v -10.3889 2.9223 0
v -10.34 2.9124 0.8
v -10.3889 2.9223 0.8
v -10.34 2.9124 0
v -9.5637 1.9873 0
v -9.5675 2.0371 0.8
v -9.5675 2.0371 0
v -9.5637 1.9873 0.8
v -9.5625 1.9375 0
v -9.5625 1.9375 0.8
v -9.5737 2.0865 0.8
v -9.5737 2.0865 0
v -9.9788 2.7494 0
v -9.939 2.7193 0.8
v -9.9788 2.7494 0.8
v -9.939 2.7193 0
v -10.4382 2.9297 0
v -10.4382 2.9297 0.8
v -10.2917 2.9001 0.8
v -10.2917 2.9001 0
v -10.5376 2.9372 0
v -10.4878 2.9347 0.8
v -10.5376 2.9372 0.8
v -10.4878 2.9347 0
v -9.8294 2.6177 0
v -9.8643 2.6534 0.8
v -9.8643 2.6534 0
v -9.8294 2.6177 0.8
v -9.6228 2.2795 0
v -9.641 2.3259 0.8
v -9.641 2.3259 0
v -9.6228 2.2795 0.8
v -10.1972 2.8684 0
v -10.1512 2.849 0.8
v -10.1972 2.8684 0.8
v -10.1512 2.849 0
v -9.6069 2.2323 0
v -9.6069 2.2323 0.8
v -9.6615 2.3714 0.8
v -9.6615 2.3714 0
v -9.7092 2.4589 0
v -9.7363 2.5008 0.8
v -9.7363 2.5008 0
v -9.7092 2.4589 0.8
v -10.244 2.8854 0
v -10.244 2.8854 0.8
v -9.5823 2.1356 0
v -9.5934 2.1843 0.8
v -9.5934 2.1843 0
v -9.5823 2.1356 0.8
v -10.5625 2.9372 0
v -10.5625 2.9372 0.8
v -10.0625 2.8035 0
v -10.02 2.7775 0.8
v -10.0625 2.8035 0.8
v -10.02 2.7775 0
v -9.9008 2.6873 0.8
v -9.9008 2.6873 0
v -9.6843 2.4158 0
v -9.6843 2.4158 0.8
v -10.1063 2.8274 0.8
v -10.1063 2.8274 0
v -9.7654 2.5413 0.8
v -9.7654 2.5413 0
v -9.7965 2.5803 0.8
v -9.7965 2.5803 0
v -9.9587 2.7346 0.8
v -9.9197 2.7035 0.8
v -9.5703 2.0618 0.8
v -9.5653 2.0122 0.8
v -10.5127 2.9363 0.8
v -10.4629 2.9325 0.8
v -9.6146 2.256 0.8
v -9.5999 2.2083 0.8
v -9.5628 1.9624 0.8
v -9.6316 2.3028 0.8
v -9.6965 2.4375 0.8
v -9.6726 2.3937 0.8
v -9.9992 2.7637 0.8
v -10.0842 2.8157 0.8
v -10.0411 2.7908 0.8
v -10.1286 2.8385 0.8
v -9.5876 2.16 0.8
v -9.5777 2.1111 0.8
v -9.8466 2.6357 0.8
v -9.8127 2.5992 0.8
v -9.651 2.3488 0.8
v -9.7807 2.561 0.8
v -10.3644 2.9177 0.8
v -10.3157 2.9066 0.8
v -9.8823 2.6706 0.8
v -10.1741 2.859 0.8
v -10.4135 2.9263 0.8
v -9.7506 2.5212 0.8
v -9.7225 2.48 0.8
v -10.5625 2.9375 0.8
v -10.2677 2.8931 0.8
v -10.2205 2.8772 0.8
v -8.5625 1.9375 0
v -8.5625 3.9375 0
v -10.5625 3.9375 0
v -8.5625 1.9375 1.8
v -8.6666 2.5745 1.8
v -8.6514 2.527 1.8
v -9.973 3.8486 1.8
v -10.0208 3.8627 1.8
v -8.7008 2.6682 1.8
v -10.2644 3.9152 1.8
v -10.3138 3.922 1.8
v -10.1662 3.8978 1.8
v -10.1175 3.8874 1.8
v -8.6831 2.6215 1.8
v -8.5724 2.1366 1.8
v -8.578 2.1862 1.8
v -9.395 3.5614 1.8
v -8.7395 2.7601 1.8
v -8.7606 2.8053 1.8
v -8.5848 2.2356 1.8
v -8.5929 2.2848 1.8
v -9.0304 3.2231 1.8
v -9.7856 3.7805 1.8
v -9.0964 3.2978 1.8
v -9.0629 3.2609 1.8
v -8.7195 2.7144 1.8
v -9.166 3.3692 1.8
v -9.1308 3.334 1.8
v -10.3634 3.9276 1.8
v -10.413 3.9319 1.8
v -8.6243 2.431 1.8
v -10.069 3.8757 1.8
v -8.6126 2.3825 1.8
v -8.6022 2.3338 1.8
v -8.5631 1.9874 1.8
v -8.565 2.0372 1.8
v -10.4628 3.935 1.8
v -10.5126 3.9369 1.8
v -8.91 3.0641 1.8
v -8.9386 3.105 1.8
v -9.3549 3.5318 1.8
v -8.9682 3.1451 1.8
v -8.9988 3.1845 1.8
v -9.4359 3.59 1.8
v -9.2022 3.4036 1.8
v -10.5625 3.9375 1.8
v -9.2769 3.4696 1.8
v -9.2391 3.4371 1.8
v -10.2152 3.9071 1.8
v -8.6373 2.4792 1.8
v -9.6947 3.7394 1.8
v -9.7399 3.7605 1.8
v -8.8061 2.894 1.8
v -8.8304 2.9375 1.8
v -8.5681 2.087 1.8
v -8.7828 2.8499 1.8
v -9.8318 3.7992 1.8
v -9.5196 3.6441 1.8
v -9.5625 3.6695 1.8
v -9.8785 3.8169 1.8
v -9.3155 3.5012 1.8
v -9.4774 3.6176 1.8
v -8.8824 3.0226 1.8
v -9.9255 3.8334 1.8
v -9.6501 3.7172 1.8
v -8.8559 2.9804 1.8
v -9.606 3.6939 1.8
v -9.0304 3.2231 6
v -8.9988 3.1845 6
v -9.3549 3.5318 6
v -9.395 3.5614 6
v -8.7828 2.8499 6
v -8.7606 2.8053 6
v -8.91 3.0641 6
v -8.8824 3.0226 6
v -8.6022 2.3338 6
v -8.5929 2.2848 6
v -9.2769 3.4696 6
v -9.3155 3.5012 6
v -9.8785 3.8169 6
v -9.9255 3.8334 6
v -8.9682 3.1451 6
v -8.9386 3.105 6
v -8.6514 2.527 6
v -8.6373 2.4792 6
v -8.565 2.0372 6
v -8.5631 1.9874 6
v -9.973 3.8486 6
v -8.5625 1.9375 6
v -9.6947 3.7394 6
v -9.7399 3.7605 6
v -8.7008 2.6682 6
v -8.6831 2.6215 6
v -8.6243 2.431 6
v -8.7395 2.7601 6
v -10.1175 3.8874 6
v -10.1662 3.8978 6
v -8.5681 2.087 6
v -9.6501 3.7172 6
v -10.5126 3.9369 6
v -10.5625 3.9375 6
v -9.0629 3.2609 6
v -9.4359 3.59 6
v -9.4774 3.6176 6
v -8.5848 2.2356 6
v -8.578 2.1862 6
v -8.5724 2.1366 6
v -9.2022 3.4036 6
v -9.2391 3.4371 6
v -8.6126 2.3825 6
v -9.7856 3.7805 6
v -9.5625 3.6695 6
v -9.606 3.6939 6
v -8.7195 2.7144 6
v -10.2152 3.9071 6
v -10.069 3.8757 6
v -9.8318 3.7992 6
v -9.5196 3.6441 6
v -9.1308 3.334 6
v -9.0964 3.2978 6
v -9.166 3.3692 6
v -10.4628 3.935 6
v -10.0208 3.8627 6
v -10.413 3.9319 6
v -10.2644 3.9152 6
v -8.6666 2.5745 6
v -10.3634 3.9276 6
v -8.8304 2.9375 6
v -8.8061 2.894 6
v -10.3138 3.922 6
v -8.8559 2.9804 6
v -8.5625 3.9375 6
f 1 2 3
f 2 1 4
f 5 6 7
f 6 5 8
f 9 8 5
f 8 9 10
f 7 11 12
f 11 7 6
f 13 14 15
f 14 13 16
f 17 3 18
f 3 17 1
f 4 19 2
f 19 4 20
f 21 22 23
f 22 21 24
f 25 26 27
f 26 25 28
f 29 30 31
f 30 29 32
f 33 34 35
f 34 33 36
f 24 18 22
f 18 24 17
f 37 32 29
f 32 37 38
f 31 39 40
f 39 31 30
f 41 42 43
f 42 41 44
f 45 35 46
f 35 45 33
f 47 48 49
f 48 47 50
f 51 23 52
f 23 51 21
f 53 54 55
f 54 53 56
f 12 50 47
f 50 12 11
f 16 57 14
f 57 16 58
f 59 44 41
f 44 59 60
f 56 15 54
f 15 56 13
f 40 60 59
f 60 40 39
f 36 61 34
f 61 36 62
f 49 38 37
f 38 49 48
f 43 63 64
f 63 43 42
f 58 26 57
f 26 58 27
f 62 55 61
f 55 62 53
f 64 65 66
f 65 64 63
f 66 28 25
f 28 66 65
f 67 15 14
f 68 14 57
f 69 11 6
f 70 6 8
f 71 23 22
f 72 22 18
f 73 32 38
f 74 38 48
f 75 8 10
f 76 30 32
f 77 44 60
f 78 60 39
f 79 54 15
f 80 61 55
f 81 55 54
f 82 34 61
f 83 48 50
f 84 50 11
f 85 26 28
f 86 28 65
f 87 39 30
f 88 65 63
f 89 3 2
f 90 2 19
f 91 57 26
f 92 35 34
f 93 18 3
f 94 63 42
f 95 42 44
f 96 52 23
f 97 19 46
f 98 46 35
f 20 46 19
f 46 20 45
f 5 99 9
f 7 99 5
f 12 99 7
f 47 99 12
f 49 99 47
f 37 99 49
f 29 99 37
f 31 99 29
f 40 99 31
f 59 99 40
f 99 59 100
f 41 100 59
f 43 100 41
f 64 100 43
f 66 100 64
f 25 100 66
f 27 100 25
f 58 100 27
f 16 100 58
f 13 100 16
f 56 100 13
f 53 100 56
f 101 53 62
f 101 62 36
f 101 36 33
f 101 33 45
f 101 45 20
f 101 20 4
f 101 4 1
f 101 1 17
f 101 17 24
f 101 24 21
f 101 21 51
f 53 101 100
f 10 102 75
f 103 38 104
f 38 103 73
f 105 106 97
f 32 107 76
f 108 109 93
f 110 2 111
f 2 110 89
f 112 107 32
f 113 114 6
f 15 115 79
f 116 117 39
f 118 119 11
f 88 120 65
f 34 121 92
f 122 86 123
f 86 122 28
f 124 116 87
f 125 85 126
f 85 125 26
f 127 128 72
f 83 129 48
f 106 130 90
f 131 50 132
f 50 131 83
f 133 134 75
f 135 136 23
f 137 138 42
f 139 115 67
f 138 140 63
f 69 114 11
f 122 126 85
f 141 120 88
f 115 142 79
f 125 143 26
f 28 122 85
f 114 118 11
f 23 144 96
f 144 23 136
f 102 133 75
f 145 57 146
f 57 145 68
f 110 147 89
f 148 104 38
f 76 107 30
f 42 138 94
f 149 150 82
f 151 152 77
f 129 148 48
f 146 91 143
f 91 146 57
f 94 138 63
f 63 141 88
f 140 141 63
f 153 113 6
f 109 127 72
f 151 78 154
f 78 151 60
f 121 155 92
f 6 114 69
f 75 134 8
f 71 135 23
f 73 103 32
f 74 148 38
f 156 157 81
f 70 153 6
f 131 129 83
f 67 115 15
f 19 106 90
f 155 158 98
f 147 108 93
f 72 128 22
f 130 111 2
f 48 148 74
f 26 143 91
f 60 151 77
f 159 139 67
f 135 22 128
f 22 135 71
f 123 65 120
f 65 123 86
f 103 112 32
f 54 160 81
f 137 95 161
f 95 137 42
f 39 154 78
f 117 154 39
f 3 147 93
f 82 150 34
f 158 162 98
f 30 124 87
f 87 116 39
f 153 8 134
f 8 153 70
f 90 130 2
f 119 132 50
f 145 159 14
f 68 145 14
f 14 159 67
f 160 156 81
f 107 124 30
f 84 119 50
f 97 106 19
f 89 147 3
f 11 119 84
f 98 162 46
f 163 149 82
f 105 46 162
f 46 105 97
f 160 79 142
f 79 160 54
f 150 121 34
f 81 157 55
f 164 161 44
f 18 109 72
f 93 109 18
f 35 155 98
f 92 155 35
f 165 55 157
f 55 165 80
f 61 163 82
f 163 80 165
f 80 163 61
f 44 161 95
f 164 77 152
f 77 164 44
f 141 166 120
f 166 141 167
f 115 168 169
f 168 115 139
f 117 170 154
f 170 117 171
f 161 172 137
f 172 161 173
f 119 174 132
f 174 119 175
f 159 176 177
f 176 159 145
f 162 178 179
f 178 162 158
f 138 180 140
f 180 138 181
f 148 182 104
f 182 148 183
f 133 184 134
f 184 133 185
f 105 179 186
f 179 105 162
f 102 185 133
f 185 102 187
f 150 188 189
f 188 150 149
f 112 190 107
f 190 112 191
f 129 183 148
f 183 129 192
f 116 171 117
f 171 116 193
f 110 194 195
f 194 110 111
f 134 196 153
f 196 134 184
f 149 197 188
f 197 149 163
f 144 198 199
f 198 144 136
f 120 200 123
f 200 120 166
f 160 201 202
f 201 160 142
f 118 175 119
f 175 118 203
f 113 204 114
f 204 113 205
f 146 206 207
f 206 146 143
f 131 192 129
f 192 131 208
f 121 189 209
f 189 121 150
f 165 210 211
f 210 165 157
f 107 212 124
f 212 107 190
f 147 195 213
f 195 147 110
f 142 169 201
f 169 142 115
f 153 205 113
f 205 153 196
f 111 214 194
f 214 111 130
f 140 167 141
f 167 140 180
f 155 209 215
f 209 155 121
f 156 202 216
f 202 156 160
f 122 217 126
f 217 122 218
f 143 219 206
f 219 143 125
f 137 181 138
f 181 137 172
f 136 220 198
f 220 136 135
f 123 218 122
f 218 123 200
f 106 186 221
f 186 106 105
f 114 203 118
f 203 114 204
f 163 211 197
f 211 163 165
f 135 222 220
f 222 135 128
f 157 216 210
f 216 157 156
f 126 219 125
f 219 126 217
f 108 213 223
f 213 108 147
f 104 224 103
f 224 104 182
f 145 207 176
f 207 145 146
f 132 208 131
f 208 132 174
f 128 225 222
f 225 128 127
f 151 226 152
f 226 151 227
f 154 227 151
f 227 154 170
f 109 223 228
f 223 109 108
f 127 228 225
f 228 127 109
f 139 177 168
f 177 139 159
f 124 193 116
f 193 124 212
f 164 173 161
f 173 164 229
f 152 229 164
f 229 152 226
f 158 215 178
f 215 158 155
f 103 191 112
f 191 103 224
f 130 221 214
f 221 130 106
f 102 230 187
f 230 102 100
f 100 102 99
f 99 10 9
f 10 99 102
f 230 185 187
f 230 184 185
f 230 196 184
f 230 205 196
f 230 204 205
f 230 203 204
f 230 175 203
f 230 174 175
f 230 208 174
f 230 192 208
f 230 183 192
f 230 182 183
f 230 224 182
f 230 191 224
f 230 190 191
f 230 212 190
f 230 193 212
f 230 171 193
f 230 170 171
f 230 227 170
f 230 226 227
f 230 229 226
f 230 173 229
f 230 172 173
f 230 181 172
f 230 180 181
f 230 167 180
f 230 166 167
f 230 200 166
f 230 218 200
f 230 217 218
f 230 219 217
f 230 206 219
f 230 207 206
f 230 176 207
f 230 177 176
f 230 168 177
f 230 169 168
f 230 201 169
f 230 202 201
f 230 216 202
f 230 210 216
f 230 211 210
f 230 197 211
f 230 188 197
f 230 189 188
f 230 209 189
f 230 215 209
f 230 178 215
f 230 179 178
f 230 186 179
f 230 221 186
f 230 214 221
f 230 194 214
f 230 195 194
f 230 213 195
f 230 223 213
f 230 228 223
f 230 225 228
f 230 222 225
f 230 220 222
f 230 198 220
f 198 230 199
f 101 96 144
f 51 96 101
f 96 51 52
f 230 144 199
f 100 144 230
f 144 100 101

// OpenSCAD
// file: ../scad/shape_modifier_utils.scad
// Overlap used to break coincident faces in booleans. Subtracting a cut that lands
// exactly on a surface leaves zero-thickness geometry, which renders unpredictably and
// slices worse; every cut is extended by this much so the faces genuinely cross.
//
// A function rather than a variable: `use <...>` exports functions but not top-level
// variable assignments, and the sweep reaches these files through `use`. Twelve modules
// across four files each declared their own `eps = 0.01` before this existed.
function geometry_eps() = 0.01;

// Length for a *centered* cutting solid that must pass entirely through material of
// depth `extent`. A centered cut reaches half this each way, so the factor leaves 50%
// clearance beyond `extent` on both sides -- a cut that lands flush on a face produces
// a zero-thickness shell rather than a clean hole.
//
// Measured against the swept parameter space: the deepest thing any of these cuts must
// clear is one bulkhead_section, one bulkhead_thickness tall, so the margin is 0.5 *
// bulkhead_thickness everywhere and scales with the part. Interconnect bulkheads stack
// two sections, but each section's cuts are applied before stacking, so the stack is
// not what a cut has to span.
function through_cut(extent) = 3 * extent;

// Distance at which to place a mask vertex so it lies outside anything within `extent`
// of the origin. Used by the half-plane polygons that trim an octant down to its
// wedge, where the vertex position only has to be "far enough" to be off the part.
//
// Worst case across 412 valid combinations is 3.25 mm of clearance, at U=0.5 with 1 mm
// panel: the shape reaches panel_offset + panel_overlap = 6.75 mm while the mask sits
// at 10 mm. Positive everywhere, and the gap widens with U.
function mask_reach(extent) = 2 * extent;


module octant_to_full() {
    mirror_x() {
        mirror_y() {
            mirror_xy() {
                children();
            }
        }
    }
}

module mirror_x() {
    union() {
        children();
        mirror([-1,0,0]) {
            children();
        }
    }
    
}

module mirror_y() {
    union() {
        children();
        mirror([0,-1,0]) {
            children();
        }
    }
    
}

module mirror_xy() {
    union() {
        children();
        mirror([1,-1,0]) {
            children();
        }
    }
}

module corner_translate(unit_width, corner_radius) {
    translate([unit_width/2-corner_radius,unit_width/2-corner_radius,0]) {
        children();
    }
}

// Move an octant out to its corner, then mirror it into all four -- the standard way
// a bulkhead profile is built from the one octant that is actually drawn.
//
// Every `*_shape` wrapper in fuselage_bulkhead_geometry.scad had this same pair open-
// coded around its own `*_octant` call. The wrappers stay: they name the full shape as
// distinct from the octant, and they are what seven call sites across two files use.
// It is the repeated body that is worth removing, not the interface.
module octant_tiled(unit_width, corner_radius) {
    octant_to_full() {
        corner_translate(unit_width, corner_radius) {
            children();
        }
    }
}


// mask lower diagonal quadrant
module octant_mask(unit_width, corner_radius) {
    eps = geometry_eps();
    polygon([[corner_radius+eps,corner_radius],
            [corner_radius+eps,-unit_width/2-corner_radius],
            [-unit_width/2-corner_radius+eps,-unit_width/2-corner_radius]]);
}

// fillet inward
module fillet_inner(radius) {
    intersection() {
        offset(r = -radius) {
            // fillet outward as well to ensure we round off any inward fillet artifacts (from input boundaries that are closer than 2*radius)
            offset(r = 2*radius) {
                offset(r = -radius) {
                    children();
                }
            }
        }
        // guarantee that the resultant shape has not gone outside the boundaries of the input shape
        children();
    }
}

// fillet outward
module fillet_outer(radius) {
    union() {
        offset(r = -radius) {
            offset(r = radius) {
                children();
            }
        }
        // guarantee that the resultant shape has not erroded into the boundaries of teh input shape
        children();
    }
}
// main file
// Five of bulkhead_flange_positive's constituent modules, isolated one at a time so the
// port can be checked against each rather than against their union.
//
// Derived parameters for U=1.0 end_bolt 3/16in.
//
//   which = 0  outer_corner_fillet
//   which = 1  bulkhead_flange_chamfer
//   which = 2  greeble_to_web_fillet
//   which = 3  bulkhead_bolt_flange_fillet
//   which = 4  web_to_bolt_fillet
//
// All five are the same shape of thing: a small block of material at a corner, minus a
// stepped stack of a cylinder, a cone and a cylinder. The step is the chamfer, and the
// result is a true fillet -- these are not the morphological fillet_inner.
//
// 3 and 4 differ from 0-2 in outline only: instead of an axis-aligned block they extrude a
// polygon whose last vertex is the fillet center pushed one radius along the ray from the
// bolt center, so bolt center / fillet center / end point are collinear by construction and
// the closing edge doubles back with zero area. Their outlines are quadrilaterals.
$fa=1;
$fs=0.05;

use <../scad/fuselage_bulkhead_geometry.scad>

make_web = true;
is_interconnect = false;
unit_width = 100.0;
bulkhead_thickness = 6;
corner_radius = 10.0;
panel_thickness = 4.7625;
panel_offset = 2.5;
panel_overlap = 4.7625;
panel_tolerance = 0.1;
bolt_hole_radius = 2.0;
bolt_thickness = 3.0;
bolt_offset = 8.0;
plate_thickness = 0.8;
flange_fillet_radius = 2.0;
flange_thickness = 1.2;
flange_chamfer = 1.0;

which = 0;

if (which == 0) {
    outer_corner_fillet(make_web, bulkhead_thickness, corner_radius, panel_thickness,
                        panel_offset, panel_overlap, panel_tolerance, plate_thickness,
                        flange_fillet_radius, flange_thickness, flange_chamfer);
} else if (which == 1) {
    bulkhead_flange_chamfer(is_interconnect, unit_width, corner_radius, panel_thickness,
                            panel_offset, panel_overlap, panel_tolerance, bolt_offset,
                            plate_thickness, flange_thickness, flange_chamfer);
} else if (which == 2) {
    greeble_to_web_fillet(bulkhead_thickness, panel_offset, panel_overlap, panel_tolerance,
                          bolt_offset, plate_thickness, flange_fillet_radius,
                          flange_thickness, flange_chamfer);
} else if (which == 3) {
    bulkhead_bolt_flange_fillet(bulkhead_thickness, panel_offset, panel_overlap,
                                panel_tolerance, bolt_hole_radius, bolt_thickness,
                                bolt_offset, plate_thickness, flange_fillet_radius,
                                flange_thickness, flange_chamfer);
} else if (which == 4) {
    web_to_bolt_fillet(bulkhead_thickness, bolt_hole_radius, bolt_thickness, bolt_offset,
                       plate_thickness, flange_fillet_radius, flange_thickness,
                       flange_chamfer);
}
